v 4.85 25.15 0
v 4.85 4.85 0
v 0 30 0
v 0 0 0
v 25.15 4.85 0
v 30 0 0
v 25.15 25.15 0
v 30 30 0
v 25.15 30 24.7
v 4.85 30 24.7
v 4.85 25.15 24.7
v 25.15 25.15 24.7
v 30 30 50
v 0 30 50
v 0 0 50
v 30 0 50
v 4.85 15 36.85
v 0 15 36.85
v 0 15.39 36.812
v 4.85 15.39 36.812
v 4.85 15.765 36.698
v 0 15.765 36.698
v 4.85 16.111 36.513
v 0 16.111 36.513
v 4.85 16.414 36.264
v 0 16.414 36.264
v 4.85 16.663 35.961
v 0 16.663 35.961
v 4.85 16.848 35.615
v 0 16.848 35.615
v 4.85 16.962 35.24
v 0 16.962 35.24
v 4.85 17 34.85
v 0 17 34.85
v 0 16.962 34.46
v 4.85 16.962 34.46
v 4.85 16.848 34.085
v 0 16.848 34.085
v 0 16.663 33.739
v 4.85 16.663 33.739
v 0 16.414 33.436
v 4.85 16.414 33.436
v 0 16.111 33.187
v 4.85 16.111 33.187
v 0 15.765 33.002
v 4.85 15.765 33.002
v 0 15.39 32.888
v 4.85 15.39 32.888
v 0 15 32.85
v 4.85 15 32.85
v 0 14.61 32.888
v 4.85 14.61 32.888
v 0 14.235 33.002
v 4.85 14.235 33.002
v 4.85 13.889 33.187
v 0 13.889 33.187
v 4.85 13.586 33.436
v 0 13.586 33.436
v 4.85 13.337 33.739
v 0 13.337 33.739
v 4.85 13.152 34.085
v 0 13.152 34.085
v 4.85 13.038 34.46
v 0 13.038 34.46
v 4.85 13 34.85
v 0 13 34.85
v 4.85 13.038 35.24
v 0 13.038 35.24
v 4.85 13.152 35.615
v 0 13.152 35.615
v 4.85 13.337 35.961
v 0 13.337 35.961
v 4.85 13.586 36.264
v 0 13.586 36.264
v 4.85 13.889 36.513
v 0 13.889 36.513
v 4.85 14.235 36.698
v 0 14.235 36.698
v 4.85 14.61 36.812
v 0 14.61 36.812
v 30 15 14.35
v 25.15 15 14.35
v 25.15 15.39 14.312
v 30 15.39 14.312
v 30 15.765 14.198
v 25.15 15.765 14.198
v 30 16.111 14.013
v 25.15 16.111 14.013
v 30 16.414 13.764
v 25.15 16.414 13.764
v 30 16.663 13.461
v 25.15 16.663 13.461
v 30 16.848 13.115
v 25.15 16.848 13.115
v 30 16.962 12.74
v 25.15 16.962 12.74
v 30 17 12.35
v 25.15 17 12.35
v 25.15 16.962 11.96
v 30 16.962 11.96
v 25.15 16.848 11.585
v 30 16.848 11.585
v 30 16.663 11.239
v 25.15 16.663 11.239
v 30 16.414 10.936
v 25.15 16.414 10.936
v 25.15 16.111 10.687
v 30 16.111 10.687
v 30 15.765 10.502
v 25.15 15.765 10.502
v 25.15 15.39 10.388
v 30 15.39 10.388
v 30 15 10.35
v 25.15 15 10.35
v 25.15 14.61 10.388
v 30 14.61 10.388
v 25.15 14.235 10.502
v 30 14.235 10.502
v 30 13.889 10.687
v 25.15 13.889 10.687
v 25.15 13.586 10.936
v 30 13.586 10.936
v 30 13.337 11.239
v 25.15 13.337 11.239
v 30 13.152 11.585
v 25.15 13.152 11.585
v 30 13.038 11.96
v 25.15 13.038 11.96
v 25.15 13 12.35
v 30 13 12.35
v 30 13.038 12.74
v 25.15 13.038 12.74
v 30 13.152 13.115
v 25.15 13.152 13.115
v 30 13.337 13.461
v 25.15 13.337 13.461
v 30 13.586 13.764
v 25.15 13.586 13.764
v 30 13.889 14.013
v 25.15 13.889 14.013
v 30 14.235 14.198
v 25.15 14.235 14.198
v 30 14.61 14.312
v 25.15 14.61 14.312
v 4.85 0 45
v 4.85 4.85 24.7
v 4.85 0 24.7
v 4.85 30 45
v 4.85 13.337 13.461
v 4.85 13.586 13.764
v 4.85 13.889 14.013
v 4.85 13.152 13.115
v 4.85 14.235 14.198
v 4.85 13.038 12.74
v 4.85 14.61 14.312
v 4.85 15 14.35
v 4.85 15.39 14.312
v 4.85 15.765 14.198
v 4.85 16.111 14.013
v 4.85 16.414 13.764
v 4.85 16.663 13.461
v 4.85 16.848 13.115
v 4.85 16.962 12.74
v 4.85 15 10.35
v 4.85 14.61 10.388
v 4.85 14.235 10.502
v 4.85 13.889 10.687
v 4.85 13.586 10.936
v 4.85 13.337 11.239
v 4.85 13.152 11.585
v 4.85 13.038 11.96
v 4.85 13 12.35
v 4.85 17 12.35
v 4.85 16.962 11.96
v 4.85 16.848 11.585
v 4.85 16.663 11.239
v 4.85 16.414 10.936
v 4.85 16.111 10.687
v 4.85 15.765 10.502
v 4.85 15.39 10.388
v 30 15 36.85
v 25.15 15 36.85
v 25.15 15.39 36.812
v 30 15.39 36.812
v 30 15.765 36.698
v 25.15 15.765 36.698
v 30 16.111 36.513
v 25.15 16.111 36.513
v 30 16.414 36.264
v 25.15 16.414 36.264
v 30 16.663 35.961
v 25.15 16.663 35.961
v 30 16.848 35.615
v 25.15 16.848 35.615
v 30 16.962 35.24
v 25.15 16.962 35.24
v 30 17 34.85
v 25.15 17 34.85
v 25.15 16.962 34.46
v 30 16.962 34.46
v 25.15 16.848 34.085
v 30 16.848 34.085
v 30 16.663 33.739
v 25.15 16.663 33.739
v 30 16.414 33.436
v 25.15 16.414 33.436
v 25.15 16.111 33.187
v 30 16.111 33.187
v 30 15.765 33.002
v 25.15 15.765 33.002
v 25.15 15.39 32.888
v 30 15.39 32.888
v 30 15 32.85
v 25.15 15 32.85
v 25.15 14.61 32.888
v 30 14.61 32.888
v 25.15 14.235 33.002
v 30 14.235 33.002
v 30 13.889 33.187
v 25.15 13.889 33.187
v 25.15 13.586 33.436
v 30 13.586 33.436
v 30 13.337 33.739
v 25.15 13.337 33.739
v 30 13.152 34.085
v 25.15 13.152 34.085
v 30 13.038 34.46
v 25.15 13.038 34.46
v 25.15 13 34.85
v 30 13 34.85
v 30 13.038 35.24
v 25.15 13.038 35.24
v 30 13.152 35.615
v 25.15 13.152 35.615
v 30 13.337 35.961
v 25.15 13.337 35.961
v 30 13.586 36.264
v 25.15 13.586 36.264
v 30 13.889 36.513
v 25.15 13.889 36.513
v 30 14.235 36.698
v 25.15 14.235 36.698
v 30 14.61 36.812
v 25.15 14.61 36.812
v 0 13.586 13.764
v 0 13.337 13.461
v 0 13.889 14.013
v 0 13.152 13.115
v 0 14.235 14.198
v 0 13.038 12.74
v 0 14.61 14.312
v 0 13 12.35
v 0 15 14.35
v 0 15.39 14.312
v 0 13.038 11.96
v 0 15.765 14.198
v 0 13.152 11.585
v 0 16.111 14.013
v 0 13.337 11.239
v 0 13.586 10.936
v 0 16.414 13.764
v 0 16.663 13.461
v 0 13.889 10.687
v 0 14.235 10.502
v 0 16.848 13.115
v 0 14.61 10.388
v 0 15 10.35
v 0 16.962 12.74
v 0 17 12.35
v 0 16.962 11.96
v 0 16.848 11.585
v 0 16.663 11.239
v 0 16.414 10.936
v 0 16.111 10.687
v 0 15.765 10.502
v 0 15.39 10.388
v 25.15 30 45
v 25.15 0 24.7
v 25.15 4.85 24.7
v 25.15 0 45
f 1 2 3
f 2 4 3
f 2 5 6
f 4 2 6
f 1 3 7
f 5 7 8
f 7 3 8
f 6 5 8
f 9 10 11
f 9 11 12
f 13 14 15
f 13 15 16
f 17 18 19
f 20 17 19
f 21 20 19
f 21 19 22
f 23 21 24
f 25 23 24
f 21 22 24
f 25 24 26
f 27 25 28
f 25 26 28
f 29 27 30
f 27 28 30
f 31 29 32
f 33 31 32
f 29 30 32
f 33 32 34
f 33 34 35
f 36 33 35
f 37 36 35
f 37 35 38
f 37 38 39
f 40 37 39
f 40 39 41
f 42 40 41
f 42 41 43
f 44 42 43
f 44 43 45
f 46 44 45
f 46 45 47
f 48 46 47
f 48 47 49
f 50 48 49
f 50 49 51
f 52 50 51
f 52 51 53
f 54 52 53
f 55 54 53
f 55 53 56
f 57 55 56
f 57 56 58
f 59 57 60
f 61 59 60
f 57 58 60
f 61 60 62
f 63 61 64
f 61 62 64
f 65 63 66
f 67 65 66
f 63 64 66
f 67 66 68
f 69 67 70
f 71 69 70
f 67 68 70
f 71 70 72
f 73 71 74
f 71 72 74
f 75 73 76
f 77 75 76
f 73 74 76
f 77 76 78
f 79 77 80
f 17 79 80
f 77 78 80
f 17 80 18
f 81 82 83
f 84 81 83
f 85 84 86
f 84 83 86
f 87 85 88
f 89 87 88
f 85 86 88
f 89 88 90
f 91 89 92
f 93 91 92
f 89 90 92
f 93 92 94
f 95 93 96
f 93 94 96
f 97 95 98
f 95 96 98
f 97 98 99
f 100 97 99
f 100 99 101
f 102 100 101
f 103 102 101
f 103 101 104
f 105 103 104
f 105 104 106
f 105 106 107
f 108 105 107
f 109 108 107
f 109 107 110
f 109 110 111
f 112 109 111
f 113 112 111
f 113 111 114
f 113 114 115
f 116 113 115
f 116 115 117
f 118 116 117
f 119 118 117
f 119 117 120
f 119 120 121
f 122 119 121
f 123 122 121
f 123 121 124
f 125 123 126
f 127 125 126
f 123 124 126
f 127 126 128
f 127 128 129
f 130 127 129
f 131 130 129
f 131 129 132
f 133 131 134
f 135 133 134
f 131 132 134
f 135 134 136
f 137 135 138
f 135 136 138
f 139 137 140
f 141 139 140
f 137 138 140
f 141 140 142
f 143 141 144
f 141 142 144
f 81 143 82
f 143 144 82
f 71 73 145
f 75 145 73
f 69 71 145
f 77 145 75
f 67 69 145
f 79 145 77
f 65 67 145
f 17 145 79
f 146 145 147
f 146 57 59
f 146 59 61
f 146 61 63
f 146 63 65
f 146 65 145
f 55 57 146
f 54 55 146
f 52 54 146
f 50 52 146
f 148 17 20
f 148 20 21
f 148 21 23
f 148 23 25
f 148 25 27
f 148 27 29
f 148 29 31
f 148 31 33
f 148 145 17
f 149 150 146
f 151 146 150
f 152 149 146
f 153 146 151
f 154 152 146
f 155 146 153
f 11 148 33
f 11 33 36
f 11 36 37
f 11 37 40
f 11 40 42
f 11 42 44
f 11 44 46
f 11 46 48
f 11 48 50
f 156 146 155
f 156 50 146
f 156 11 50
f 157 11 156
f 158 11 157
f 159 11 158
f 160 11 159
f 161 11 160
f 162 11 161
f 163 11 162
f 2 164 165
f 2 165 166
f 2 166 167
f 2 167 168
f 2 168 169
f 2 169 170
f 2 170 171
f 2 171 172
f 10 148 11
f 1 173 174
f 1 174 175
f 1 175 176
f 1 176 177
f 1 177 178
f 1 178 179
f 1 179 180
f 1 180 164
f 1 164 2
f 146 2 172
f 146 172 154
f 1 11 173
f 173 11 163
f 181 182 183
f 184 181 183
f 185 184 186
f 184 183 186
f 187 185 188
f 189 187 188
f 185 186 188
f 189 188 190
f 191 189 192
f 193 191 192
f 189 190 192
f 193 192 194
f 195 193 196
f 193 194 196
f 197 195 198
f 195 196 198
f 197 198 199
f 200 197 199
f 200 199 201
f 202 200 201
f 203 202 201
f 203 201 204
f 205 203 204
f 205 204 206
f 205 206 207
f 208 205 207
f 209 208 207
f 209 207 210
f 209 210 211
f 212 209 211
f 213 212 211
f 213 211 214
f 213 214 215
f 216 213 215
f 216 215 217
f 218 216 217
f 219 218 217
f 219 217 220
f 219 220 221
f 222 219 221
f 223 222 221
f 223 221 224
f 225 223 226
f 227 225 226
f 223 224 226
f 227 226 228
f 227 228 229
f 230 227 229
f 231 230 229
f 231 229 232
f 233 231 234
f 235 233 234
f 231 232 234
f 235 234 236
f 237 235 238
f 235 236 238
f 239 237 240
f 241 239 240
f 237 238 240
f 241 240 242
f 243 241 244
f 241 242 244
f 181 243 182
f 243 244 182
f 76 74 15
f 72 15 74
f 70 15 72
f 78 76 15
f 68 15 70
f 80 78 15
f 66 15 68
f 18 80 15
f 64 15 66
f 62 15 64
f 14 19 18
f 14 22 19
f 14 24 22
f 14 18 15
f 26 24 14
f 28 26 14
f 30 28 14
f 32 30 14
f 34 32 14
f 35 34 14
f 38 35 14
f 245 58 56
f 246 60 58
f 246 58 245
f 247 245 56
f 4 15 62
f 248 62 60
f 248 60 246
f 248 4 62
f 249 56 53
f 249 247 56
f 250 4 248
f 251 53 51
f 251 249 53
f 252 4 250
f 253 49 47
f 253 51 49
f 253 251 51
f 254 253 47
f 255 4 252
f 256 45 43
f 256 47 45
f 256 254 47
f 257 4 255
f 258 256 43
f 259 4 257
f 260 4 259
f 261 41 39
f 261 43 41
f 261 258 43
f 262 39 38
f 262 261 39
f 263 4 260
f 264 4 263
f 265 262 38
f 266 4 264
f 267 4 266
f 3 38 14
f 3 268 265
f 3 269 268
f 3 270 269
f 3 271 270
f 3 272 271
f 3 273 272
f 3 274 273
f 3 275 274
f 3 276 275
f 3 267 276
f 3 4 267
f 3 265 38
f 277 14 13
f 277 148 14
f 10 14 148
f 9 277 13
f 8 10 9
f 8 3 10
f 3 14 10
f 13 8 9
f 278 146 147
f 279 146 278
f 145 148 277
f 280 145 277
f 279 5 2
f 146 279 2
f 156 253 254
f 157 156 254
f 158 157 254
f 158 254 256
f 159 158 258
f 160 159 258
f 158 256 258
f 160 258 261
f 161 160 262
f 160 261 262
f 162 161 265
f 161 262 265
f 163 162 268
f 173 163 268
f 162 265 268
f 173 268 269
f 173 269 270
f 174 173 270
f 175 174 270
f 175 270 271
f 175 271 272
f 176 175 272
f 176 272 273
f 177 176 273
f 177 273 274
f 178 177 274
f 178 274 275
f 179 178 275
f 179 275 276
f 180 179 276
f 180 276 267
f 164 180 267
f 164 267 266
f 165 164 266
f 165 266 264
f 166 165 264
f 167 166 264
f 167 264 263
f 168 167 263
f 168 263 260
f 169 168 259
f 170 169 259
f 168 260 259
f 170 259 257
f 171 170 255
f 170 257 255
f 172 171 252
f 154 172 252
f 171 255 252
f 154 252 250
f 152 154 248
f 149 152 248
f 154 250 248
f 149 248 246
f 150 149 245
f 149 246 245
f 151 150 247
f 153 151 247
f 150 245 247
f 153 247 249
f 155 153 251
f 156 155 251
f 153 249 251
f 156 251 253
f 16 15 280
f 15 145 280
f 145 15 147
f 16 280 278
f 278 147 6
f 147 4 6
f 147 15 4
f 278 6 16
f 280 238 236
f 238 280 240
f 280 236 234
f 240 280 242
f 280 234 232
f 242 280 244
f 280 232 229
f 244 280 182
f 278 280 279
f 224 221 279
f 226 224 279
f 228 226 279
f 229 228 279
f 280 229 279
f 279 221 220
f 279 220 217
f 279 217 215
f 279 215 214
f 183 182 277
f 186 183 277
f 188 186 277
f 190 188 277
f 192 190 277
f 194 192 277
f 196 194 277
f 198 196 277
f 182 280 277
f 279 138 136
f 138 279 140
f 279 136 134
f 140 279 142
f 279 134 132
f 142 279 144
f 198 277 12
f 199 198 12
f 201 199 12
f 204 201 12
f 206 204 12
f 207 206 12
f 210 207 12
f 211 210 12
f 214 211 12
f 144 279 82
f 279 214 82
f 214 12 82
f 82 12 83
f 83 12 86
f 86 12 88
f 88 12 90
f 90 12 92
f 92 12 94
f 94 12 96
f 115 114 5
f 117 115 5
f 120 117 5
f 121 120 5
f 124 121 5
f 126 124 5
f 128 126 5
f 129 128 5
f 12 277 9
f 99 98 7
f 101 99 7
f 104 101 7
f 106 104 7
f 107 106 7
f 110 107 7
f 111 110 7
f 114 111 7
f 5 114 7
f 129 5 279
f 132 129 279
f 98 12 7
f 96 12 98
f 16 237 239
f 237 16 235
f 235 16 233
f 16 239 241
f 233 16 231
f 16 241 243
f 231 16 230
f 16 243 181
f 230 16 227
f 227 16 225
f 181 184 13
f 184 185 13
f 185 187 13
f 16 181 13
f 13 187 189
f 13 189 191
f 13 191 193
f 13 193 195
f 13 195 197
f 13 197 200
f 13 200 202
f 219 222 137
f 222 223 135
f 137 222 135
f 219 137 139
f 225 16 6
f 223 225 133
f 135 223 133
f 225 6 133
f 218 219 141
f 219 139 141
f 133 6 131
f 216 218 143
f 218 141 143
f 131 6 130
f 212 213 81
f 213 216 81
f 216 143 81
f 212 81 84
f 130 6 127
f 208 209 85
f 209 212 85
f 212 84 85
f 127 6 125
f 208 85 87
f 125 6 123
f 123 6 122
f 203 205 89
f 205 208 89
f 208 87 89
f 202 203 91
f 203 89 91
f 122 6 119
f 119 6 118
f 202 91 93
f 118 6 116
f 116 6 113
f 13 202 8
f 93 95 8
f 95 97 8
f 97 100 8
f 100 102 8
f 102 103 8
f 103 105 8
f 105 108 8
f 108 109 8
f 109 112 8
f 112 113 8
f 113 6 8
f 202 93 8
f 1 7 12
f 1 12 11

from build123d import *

# Parameters (mm, degrees)
SKETCH1_W           = 30
SKETCH1_H           = 30
BOSS_EXTRUDE1_DEPTH = 50
SKETCH3_W           = 20.3
SKETCH3_H           = 20.3
CUT_EXTRUDE1_DEPTH  = 66.574385243
SKETCH2_W           = 20.3
SKETCH2_H           = 20.3
CUT_EXTRUDE2_DEPTH  = 30
SKETCH5_R           = 2
CUT_EXTRUDE3_DEPTH  = 66.574385243


with BuildPart() as part:
    # Sketch1 → Boss-Extrude1 (new body)
    with BuildSketch(Plane.XY):
        with Locations((15, 15)):
            Rectangle(SKETCH1_W, SKETCH1_H)
    extrude(amount=BOSS_EXTRUDE1_DEPTH)

    # Sketch3 → Cut-Extrude1 (cut, through all)
    with BuildSketch(Plane(origin=(0, 30, 0), x_dir=(1, 0, 0), z_dir=(0, 1, 0))):
        with Locations((15, -34.85)):
            Rectangle(SKETCH3_W, SKETCH3_H)
    extrude(amount=-CUT_EXTRUDE1_DEPTH, mode=Mode.SUBTRACT)

    # Sketch2 → Cut-Extrude2 (cut)
    with BuildSketch(Plane(origin=(0, 0, 0), x_dir=(-1, 0, 0), z_dir=(0, 0, -1))):
        with Locations((-15, 15)):
            Rectangle(SKETCH2_W, SKETCH2_H)
    extrude(amount=-CUT_EXTRUDE2_DEPTH, mode=Mode.SUBTRACT)

    # Sketch5 → Cut-Extrude3 (cut, through all)
    with BuildSketch(Plane.ZY):
        with Locations((34.85, 15)):
            Circle(SKETCH5_R)
        with Locations((12.35, 15)):
            Circle(SKETCH5_R)
    extrude(amount=-CUT_EXTRUDE3_DEPTH, mode=Mode.SUBTRACT)


solid = part.part
